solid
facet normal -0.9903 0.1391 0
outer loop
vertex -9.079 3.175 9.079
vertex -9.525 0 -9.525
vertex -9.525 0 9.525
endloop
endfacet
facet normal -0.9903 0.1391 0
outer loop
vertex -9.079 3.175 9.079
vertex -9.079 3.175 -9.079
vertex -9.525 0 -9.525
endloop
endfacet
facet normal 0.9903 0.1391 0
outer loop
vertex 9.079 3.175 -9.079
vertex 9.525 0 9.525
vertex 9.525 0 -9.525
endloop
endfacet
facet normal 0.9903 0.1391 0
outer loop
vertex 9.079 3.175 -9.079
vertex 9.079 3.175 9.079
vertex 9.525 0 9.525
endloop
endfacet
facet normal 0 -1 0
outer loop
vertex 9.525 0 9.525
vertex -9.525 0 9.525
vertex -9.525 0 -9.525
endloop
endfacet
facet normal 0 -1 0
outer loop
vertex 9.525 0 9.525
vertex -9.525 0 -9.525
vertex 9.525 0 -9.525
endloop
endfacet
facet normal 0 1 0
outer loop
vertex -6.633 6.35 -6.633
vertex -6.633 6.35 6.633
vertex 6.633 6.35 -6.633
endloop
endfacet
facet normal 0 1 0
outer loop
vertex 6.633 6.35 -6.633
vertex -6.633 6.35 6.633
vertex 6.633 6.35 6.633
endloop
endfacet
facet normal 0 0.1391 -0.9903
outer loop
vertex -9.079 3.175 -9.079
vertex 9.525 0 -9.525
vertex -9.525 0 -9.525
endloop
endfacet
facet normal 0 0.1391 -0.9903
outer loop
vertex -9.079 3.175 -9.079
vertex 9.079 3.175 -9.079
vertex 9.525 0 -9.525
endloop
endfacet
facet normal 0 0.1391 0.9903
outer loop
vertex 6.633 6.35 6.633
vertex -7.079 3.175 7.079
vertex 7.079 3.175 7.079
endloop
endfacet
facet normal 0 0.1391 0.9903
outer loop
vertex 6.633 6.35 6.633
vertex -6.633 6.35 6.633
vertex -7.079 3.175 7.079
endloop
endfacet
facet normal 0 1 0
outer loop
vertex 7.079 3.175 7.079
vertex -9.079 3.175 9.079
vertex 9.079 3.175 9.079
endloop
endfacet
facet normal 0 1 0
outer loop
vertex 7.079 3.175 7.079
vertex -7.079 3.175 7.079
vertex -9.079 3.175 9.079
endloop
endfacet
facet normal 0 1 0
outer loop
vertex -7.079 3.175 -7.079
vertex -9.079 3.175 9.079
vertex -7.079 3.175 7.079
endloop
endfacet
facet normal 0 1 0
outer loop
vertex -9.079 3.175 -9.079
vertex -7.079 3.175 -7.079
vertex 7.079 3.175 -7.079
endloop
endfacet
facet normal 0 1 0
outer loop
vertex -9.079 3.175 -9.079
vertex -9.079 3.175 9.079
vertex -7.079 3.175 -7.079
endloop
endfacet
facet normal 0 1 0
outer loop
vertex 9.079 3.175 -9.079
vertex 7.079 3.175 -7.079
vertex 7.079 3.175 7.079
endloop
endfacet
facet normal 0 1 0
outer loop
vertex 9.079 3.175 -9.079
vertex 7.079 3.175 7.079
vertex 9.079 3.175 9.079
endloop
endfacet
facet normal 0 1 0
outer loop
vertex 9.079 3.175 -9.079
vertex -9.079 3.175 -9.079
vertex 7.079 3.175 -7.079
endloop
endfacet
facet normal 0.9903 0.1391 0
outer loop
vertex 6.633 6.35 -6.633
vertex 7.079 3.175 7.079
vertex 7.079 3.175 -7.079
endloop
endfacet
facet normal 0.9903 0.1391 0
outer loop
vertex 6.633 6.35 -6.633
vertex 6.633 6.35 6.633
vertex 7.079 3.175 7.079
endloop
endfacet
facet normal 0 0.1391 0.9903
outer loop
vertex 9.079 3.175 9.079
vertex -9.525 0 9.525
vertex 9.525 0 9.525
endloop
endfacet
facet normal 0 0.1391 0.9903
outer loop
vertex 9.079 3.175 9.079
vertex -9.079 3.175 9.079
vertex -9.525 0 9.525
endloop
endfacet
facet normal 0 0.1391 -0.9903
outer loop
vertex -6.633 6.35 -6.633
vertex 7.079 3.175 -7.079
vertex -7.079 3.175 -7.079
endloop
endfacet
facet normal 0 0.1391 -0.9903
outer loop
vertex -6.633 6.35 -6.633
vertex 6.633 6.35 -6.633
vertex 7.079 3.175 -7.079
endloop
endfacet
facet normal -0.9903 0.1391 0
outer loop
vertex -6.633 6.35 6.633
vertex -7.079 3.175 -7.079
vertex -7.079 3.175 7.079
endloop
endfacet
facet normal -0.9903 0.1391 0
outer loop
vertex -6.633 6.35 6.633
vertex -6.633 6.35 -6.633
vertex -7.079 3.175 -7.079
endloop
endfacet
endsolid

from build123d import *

# Parameters (mm, degrees)
SKETCH2_W           = 19.05
SKETCH2_H           = 19.05
BOSS_EXTRUDE1_DEPTH = 3.175
BOSS_EXTRUDE1_TAPER = 8
SKETCH3_W           = 14.1575657
SKETCH3_H           = 14.1575657
BOSS_EXTRUDE2_DEPTH = 3.175
BOSS_EXTRUDE2_TAPER = 8


with BuildPart() as part:
    # Sketch2 → Boss-Extrude1 (new body)
    with BuildSketch(Plane(origin=(0, 0, 0), x_dir=(1, 0, 0), z_dir=(0, 1, 0))):
        Rectangle(SKETCH2_W, SKETCH2_H)
    extrude(amount=BOSS_EXTRUDE1_DEPTH, taper=BOSS_EXTRUDE1_TAPER)

    # Sketch3 → Boss-Extrude2 (add)
    with BuildSketch(Plane(origin=(0, 3.175, 0), x_dir=(1, 0, 0), z_dir=(0, 1, 0))):
        Rectangle(SKETCH3_W, SKETCH3_H)
    extrude(amount=BOSS_EXTRUDE2_DEPTH, taper=BOSS_EXTRUDE2_TAPER)


solid = part.part
